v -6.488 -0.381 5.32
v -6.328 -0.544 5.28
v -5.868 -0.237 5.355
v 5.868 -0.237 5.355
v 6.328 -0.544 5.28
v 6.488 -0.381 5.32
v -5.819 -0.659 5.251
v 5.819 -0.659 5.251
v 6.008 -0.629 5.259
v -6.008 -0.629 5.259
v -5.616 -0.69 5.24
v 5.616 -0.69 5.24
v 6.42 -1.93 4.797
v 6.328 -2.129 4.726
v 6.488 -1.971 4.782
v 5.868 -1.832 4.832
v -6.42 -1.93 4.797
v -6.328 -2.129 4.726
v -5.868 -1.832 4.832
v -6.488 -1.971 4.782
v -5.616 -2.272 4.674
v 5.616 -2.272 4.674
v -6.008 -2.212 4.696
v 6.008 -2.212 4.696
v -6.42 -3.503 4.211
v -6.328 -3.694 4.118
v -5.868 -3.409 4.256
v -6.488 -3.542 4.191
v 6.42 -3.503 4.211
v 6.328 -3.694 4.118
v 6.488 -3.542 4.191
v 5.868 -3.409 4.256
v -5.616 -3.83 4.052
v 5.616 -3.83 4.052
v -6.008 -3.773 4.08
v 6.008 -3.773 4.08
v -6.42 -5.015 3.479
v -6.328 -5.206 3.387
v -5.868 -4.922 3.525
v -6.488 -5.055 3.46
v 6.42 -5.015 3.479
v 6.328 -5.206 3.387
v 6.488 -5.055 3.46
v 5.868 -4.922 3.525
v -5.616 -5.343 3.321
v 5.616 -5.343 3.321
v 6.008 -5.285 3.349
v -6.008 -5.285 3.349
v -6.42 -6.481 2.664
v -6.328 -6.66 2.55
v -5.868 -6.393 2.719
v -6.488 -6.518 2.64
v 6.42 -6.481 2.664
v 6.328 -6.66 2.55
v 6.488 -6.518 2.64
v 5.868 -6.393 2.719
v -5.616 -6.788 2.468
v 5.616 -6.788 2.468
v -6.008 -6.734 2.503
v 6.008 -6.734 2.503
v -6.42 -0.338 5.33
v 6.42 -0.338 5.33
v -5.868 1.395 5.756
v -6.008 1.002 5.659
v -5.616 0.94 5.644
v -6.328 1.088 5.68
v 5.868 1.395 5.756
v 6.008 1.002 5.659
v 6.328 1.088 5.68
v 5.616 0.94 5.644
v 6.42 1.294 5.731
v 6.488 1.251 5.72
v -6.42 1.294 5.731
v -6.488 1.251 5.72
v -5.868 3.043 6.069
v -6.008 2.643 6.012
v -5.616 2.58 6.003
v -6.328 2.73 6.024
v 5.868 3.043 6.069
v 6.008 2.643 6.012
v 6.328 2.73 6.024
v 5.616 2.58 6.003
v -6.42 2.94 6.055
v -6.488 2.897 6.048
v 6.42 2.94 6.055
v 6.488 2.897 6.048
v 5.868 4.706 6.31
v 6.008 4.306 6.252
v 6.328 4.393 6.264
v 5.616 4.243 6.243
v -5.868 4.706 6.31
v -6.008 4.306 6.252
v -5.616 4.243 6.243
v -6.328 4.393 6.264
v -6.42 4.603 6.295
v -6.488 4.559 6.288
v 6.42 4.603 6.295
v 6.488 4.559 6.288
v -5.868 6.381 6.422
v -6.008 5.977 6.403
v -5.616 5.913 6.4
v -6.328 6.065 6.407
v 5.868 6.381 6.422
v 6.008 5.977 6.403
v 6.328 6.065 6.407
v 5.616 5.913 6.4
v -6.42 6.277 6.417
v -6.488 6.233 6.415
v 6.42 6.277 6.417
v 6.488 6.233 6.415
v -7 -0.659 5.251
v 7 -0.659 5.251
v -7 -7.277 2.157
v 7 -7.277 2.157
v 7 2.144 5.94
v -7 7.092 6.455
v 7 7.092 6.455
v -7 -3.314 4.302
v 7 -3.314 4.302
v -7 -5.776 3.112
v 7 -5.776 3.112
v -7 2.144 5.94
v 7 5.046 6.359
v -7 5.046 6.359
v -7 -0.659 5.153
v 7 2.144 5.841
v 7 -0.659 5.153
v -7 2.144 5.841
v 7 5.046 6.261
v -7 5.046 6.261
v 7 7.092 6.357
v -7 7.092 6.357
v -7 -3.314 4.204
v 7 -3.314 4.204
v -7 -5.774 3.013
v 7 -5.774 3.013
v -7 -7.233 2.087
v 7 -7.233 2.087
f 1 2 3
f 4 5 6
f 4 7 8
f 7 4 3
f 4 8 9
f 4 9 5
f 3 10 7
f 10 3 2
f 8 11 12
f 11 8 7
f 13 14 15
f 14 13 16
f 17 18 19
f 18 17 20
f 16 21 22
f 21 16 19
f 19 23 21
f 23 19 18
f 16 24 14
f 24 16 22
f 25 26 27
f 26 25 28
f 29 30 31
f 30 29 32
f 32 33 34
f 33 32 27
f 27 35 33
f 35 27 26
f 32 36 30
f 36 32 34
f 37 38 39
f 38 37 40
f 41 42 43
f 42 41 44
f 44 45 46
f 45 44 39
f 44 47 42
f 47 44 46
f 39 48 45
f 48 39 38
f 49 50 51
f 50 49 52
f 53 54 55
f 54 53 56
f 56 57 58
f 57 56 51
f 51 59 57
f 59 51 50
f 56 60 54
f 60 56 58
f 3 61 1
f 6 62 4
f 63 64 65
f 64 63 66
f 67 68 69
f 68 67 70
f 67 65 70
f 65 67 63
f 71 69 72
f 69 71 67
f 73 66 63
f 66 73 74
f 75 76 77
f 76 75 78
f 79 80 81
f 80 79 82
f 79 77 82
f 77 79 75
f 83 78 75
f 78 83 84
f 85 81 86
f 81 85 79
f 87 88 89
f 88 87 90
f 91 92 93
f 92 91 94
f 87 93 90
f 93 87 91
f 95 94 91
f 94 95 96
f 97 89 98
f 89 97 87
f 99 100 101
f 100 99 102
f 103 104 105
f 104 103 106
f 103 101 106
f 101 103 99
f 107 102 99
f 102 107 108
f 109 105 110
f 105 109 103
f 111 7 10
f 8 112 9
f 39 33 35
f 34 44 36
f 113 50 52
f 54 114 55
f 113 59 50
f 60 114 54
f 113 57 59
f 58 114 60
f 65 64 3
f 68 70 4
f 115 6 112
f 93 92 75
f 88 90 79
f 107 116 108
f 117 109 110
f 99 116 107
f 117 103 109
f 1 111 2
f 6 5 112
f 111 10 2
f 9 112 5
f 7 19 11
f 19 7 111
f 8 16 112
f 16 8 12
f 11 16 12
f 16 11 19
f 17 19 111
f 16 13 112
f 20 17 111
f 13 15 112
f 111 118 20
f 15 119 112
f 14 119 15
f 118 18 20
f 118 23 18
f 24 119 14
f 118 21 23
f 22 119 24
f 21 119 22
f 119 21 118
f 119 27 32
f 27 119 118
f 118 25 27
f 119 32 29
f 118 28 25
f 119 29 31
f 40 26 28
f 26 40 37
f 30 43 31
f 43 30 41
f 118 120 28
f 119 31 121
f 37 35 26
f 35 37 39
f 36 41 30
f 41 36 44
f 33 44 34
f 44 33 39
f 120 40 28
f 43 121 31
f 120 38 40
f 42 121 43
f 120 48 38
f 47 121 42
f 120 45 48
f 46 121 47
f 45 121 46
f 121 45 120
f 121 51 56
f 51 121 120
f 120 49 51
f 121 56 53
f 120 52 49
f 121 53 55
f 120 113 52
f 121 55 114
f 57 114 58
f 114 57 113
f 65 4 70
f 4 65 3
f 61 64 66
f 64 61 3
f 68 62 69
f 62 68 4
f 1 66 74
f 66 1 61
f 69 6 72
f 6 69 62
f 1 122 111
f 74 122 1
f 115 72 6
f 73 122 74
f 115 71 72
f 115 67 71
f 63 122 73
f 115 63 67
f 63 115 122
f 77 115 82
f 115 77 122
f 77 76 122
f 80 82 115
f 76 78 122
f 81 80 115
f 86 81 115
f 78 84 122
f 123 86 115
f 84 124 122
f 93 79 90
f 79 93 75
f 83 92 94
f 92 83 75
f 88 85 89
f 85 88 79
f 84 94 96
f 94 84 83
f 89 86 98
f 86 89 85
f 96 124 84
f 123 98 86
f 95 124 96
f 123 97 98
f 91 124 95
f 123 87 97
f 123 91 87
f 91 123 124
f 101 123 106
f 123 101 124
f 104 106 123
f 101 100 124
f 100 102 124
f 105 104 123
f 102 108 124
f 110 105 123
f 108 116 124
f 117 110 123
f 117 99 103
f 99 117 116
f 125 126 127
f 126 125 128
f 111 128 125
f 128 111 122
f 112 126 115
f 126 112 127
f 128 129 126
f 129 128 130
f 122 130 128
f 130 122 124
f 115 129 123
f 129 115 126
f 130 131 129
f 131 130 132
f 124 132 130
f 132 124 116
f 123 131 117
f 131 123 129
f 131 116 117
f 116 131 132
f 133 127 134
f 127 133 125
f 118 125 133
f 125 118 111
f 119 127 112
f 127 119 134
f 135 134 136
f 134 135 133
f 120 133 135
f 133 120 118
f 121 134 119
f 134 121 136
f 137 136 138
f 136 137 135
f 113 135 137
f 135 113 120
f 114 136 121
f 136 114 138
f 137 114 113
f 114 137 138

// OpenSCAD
use <../lib.scad>
use <s/6296256fc01s01.scad>
function ldraw_lib__6372023fc01() = [
// 0 Sticker  1.9 x  1.8 with 9 Air Outlet Gills on Bright Light Blue (Formed)
// 0 Name: 6372023fc01.dat
// 0 Author: Magnus Forsberg [MagFors]
// 0 !LDRAW_ORG Part UPDATE 2024-05
// 0 !LICENSE Licensed under CC BY 4.0 : see CAreadme.txt
// 
// 0 BFC CERTIFY CCW
  [0,"BFC","CERTIFY"],
  [0,"BFC","CCW"],
// 
// 0 !KEYWORDS 500, Bricklink 77942stk01, Brickowl 1064764, Cinquecento, FIAT
// 0 !KEYWORDS Nuova, Rebrickable 83460, set 77942
// 
// 0 !HISTORY 2024-06-30 [OrionP] Official Update 2024-05
// 
// 
// 1 212 0 0 0 1 0 0 0 1 0 0 0 1 s\6296256fc01s01.dat
  [1,212,0,0,0,1,0,0,0,1,0,0,0,1, ldraw_lib__s__6296256fc01s01()],
// 0 // backside
// 4 16 -17.5 -12.8827 -1.648 -17.5 -14.6036 5.36 17.5 -14.6036 5.36 17.5 -12.8827 -1.648
  [4,16,-17.5,-12.8827,-1.648,-17.5,-14.6036,5.36,17.5,-14.6036,5.36,17.5,-12.8827,-1.648],
// 4 16 -17.5 -12.8827 -1.648 -17.5 -13.1279 -1.648 -17.5 -14.8489 5.36 -17.5 -14.6036 5.36
  [4,16,-17.5,-12.8827,-1.648,-17.5,-13.1279,-1.648,-17.5,-14.8489,5.36,-17.5,-14.6036,5.36],
// 4 16 17.5 -13.1279 -1.648 17.5 -12.8827 -1.648 17.5 -14.6036 5.36 17.5 -14.8489 5.36
  [4,16,17.5,-13.1279,-1.648,17.5,-12.8827,-1.648,17.5,-14.6036,5.36,17.5,-14.8489,5.36],
// 4 16 17.5 -14.6036 5.36 -17.5 -14.6036 5.36 -17.5 -15.6524 12.616 17.5 -15.6524 12.616
  [4,16,17.5,-14.6036,5.36,-17.5,-14.6036,5.36,-17.5,-15.6524,12.616,17.5,-15.6524,12.616],
// 4 16 -17.5 -14.6036 5.36 -17.5 -14.8489 5.36 -17.5 -15.8969 12.616 -17.5 -15.6524 12.616
  [4,16,-17.5,-14.6036,5.36,-17.5,-14.8489,5.36,-17.5,-15.8969,12.616,-17.5,-15.6524,12.616],
// 4 16 17.5 -14.8489 5.36 17.5 -14.6036 5.36 17.5 -15.6524 12.616 17.5 -15.8969 12.616
  [4,16,17.5,-14.8489,5.36,17.5,-14.6036,5.36,17.5,-15.6524,12.616,17.5,-15.8969,12.616],
// 4 16 -17.5 -15.6524 12.616 -17.5 -15.8932 17.7298 17.5 -15.8932 17.7298 17.5 -15.6524 12.616
  [4,16,-17.5,-15.6524,12.616,-17.5,-15.8932,17.7298,17.5,-15.8932,17.7298,17.5,-15.6524,12.616],
// 4 16 -17.5 -15.6524 12.616 -17.5 -15.8969 12.616 -17.5 -16.1379 17.7301 -17.5 -15.8932 17.7298
  [4,16,-17.5,-15.6524,12.616,-17.5,-15.8969,12.616,-17.5,-16.1379,17.7301,-17.5,-15.8932,17.7298],
// 4 16 17.5 -15.8969 12.616 17.5 -15.6524 12.616 17.5 -15.8932 17.7298 17.5 -16.1379 17.7301
  [4,16,17.5,-15.8969,12.616,17.5,-15.6524,12.616,17.5,-15.8932,17.7298,17.5,-16.1379,17.7301],
// 4 16 -17.5 -16.1379 17.7301 17.5 -16.1379 17.7301 17.5 -15.8932 17.7298 -17.5 -15.8932 17.7298
  [4,16,-17.5,-16.1379,17.7301,17.5,-16.1379,17.7301,17.5,-15.8932,17.7298,-17.5,-15.8932,17.7298],
// 4 16 17.5 -12.8827 -1.648 17.5 -10.5099 -8.284 -17.5 -10.5099 -8.284 -17.5 -12.8827 -1.648
  [4,16,17.5,-12.8827,-1.648,17.5,-10.5099,-8.284,-17.5,-10.5099,-8.284,-17.5,-12.8827,-1.648],
// 4 16 -17.5 -12.8827 -1.648 -17.5 -10.5099 -8.284 -17.5 -10.7549 -8.284 -17.5 -13.1279 -1.648
  [4,16,-17.5,-12.8827,-1.648,-17.5,-10.5099,-8.284,-17.5,-10.7549,-8.284,-17.5,-13.1279,-1.648],
// 4 16 17.5 -13.1279 -1.648 17.5 -10.7549 -8.284 17.5 -10.5099 -8.284 17.5 -12.8827 -1.648
  [4,16,17.5,-13.1279,-1.648,17.5,-10.7549,-8.284,17.5,-10.5099,-8.284,17.5,-12.8827,-1.648],
// 4 16 -17.5 -10.5099 -8.284 17.5 -10.5099 -8.284 17.5 -7.5316 -14.436 -17.5 -7.5316 -14.436
  [4,16,-17.5,-10.5099,-8.284,17.5,-10.5099,-8.284,17.5,-7.5316,-14.436,-17.5,-7.5316,-14.436],
// 4 16 -17.5 -10.7549 -8.284 -17.5 -10.5099 -8.284 -17.5 -7.5316 -14.436 -17.5 -7.7789 -14.44
  [4,16,-17.5,-10.7549,-8.284,-17.5,-10.5099,-8.284,-17.5,-7.5316,-14.436,-17.5,-7.7789,-14.44],
// 4 16 17.5 -10.5099 -8.284 17.5 -10.7549 -8.284 17.5 -7.7789 -14.44 17.5 -7.5316 -14.436
  [4,16,17.5,-10.5099,-8.284,17.5,-10.7549,-8.284,17.5,-7.7789,-14.44,17.5,-7.5316,-14.436],
// 4 16 -17.5 -7.5316 -14.436 17.5 -7.5316 -14.436 17.5 -5.2174 -18.0819 -17.5 -5.2174 -18.0819
  [4,16,-17.5,-7.5316,-14.436,17.5,-7.5316,-14.436,17.5,-5.2174,-18.0819,-17.5,-5.2174,-18.0819],
// 4 16 -17.5 -7.7789 -14.44 -17.5 -7.5316 -14.436 -17.5 -5.2174 -18.0819 -17.5 -5.3931 -18.1936
  [4,16,-17.5,-7.7789,-14.44,-17.5,-7.5316,-14.436,-17.5,-5.2174,-18.0819,-17.5,-5.3931,-18.1936],
// 4 16 17.5 -7.5316 -14.436 17.5 -7.7789 -14.44 17.5 -5.3931 -18.1936 17.5 -5.2174 -18.0819
  [4,16,17.5,-7.5316,-14.436,17.5,-7.7789,-14.44,17.5,-5.3931,-18.1936,17.5,-5.2174,-18.0819],
// 4 16 -17.5 -5.3931 -18.1936 -17.5 -5.2174 -18.0819 17.5 -5.2174 -18.0819 17.5 -5.3931 -18.1936
  [4,16,-17.5,-5.3931,-18.1936,-17.5,-5.2174,-18.0819,17.5,-5.2174,-18.0819,17.5,-5.3931,-18.1936],
// 5 24 17.5 -15.8969 12.616 -17.5 -15.8969 12.616 17.5 -16.1379 17.7301 17.5 -14.8489 5.36
  [5,24,17.5,-15.8969,12.616,-17.5,-15.8969,12.616,17.5,-16.1379,17.7301,17.5,-14.8489,5.36],
// 5 24 17.5 -14.8489 5.36 -17.5 -14.8489 5.36 17.5 -15.8969 12.616 17.5 -13.1279 -1.648
  [5,24,17.5,-14.8489,5.36,-17.5,-14.8489,5.36,17.5,-15.8969,12.616,17.5,-13.1279,-1.648],
// 5 24 17.5 -13.1279 -1.648 -17.5 -13.1279 -1.648 17.5 -14.8489 5.36 17.5 -10.7549 -8.284
  [5,24,17.5,-13.1279,-1.648,-17.5,-13.1279,-1.648,17.5,-14.8489,5.36,17.5,-10.7549,-8.284],
// 5 24 17.5 -10.7549 -8.284 -17.5 -10.7549 -8.284 17.5 -13.1279 -1.648 17.5 -7.7789 -14.44
  [5,24,17.5,-10.7549,-8.284,-17.5,-10.7549,-8.284,17.5,-13.1279,-1.648,17.5,-7.7789,-14.44],
// 5 24 17.5 -7.7789 -14.44 -17.5 -7.7789 -14.44 17.5 -10.7549 -8.284 17.5 -5.3931 -18.1936
  [5,24,17.5,-7.7789,-14.44,-17.5,-7.7789,-14.44,17.5,-10.7549,-8.284,17.5,-5.3931,-18.1936],
// 5 24 17.5 -15.6524 12.616 -17.5 -15.6524 12.616 17.5 -15.8932 17.7298 17.5 -14.6036 5.36
  [5,24,17.5,-15.6524,12.616,-17.5,-15.6524,12.616,17.5,-15.8932,17.7298,17.5,-14.6036,5.36],
// 5 24 17.5 -14.6036 5.36 -17.5 -14.6036 5.36 17.5 -15.6524 12.616 17.5 -12.8827 -1.648
  [5,24,17.5,-14.6036,5.36,-17.5,-14.6036,5.36,17.5,-15.6524,12.616,17.5,-12.8827,-1.648],
// 5 24 17.5 -12.8827 -1.648 -17.5 -12.8827 -1.648 17.5 -14.6036 5.36 17.5 -10.5099 -8.284
  [5,24,17.5,-12.8827,-1.648,-17.5,-12.8827,-1.648,17.5,-14.6036,5.36,17.5,-10.5099,-8.284],
// 5 24 17.5 -10.5099 -8.284 -17.5 -10.5099 -8.284 17.5 -12.8827 -1.648 17.5 -7.5316 -14.436
  [5,24,17.5,-10.5099,-8.284,-17.5,-10.5099,-8.284,17.5,-12.8827,-1.648,17.5,-7.5316,-14.436],
// 5 24 17.5 -7.5316 -14.436 -17.5 -7.5316 -14.436 17.5 -10.5099 -8.284 17.5 -5.2174 -18.0819
  [5,24,17.5,-7.5316,-14.436,-17.5,-7.5316,-14.436,17.5,-10.5099,-8.284,17.5,-5.2174,-18.0819],
];
module ldraw_lib__6372023fc01(step=0, col=false, unit=2/5, alt=false, line=0.2, solid=!$preview)
    makepoly(ldraw_lib__6372023fc01(), step=step, col=col, unit=unit, alt=alt, line=line, solid=solid);
ldraw_lib__6372023fc01(line=0.2);
